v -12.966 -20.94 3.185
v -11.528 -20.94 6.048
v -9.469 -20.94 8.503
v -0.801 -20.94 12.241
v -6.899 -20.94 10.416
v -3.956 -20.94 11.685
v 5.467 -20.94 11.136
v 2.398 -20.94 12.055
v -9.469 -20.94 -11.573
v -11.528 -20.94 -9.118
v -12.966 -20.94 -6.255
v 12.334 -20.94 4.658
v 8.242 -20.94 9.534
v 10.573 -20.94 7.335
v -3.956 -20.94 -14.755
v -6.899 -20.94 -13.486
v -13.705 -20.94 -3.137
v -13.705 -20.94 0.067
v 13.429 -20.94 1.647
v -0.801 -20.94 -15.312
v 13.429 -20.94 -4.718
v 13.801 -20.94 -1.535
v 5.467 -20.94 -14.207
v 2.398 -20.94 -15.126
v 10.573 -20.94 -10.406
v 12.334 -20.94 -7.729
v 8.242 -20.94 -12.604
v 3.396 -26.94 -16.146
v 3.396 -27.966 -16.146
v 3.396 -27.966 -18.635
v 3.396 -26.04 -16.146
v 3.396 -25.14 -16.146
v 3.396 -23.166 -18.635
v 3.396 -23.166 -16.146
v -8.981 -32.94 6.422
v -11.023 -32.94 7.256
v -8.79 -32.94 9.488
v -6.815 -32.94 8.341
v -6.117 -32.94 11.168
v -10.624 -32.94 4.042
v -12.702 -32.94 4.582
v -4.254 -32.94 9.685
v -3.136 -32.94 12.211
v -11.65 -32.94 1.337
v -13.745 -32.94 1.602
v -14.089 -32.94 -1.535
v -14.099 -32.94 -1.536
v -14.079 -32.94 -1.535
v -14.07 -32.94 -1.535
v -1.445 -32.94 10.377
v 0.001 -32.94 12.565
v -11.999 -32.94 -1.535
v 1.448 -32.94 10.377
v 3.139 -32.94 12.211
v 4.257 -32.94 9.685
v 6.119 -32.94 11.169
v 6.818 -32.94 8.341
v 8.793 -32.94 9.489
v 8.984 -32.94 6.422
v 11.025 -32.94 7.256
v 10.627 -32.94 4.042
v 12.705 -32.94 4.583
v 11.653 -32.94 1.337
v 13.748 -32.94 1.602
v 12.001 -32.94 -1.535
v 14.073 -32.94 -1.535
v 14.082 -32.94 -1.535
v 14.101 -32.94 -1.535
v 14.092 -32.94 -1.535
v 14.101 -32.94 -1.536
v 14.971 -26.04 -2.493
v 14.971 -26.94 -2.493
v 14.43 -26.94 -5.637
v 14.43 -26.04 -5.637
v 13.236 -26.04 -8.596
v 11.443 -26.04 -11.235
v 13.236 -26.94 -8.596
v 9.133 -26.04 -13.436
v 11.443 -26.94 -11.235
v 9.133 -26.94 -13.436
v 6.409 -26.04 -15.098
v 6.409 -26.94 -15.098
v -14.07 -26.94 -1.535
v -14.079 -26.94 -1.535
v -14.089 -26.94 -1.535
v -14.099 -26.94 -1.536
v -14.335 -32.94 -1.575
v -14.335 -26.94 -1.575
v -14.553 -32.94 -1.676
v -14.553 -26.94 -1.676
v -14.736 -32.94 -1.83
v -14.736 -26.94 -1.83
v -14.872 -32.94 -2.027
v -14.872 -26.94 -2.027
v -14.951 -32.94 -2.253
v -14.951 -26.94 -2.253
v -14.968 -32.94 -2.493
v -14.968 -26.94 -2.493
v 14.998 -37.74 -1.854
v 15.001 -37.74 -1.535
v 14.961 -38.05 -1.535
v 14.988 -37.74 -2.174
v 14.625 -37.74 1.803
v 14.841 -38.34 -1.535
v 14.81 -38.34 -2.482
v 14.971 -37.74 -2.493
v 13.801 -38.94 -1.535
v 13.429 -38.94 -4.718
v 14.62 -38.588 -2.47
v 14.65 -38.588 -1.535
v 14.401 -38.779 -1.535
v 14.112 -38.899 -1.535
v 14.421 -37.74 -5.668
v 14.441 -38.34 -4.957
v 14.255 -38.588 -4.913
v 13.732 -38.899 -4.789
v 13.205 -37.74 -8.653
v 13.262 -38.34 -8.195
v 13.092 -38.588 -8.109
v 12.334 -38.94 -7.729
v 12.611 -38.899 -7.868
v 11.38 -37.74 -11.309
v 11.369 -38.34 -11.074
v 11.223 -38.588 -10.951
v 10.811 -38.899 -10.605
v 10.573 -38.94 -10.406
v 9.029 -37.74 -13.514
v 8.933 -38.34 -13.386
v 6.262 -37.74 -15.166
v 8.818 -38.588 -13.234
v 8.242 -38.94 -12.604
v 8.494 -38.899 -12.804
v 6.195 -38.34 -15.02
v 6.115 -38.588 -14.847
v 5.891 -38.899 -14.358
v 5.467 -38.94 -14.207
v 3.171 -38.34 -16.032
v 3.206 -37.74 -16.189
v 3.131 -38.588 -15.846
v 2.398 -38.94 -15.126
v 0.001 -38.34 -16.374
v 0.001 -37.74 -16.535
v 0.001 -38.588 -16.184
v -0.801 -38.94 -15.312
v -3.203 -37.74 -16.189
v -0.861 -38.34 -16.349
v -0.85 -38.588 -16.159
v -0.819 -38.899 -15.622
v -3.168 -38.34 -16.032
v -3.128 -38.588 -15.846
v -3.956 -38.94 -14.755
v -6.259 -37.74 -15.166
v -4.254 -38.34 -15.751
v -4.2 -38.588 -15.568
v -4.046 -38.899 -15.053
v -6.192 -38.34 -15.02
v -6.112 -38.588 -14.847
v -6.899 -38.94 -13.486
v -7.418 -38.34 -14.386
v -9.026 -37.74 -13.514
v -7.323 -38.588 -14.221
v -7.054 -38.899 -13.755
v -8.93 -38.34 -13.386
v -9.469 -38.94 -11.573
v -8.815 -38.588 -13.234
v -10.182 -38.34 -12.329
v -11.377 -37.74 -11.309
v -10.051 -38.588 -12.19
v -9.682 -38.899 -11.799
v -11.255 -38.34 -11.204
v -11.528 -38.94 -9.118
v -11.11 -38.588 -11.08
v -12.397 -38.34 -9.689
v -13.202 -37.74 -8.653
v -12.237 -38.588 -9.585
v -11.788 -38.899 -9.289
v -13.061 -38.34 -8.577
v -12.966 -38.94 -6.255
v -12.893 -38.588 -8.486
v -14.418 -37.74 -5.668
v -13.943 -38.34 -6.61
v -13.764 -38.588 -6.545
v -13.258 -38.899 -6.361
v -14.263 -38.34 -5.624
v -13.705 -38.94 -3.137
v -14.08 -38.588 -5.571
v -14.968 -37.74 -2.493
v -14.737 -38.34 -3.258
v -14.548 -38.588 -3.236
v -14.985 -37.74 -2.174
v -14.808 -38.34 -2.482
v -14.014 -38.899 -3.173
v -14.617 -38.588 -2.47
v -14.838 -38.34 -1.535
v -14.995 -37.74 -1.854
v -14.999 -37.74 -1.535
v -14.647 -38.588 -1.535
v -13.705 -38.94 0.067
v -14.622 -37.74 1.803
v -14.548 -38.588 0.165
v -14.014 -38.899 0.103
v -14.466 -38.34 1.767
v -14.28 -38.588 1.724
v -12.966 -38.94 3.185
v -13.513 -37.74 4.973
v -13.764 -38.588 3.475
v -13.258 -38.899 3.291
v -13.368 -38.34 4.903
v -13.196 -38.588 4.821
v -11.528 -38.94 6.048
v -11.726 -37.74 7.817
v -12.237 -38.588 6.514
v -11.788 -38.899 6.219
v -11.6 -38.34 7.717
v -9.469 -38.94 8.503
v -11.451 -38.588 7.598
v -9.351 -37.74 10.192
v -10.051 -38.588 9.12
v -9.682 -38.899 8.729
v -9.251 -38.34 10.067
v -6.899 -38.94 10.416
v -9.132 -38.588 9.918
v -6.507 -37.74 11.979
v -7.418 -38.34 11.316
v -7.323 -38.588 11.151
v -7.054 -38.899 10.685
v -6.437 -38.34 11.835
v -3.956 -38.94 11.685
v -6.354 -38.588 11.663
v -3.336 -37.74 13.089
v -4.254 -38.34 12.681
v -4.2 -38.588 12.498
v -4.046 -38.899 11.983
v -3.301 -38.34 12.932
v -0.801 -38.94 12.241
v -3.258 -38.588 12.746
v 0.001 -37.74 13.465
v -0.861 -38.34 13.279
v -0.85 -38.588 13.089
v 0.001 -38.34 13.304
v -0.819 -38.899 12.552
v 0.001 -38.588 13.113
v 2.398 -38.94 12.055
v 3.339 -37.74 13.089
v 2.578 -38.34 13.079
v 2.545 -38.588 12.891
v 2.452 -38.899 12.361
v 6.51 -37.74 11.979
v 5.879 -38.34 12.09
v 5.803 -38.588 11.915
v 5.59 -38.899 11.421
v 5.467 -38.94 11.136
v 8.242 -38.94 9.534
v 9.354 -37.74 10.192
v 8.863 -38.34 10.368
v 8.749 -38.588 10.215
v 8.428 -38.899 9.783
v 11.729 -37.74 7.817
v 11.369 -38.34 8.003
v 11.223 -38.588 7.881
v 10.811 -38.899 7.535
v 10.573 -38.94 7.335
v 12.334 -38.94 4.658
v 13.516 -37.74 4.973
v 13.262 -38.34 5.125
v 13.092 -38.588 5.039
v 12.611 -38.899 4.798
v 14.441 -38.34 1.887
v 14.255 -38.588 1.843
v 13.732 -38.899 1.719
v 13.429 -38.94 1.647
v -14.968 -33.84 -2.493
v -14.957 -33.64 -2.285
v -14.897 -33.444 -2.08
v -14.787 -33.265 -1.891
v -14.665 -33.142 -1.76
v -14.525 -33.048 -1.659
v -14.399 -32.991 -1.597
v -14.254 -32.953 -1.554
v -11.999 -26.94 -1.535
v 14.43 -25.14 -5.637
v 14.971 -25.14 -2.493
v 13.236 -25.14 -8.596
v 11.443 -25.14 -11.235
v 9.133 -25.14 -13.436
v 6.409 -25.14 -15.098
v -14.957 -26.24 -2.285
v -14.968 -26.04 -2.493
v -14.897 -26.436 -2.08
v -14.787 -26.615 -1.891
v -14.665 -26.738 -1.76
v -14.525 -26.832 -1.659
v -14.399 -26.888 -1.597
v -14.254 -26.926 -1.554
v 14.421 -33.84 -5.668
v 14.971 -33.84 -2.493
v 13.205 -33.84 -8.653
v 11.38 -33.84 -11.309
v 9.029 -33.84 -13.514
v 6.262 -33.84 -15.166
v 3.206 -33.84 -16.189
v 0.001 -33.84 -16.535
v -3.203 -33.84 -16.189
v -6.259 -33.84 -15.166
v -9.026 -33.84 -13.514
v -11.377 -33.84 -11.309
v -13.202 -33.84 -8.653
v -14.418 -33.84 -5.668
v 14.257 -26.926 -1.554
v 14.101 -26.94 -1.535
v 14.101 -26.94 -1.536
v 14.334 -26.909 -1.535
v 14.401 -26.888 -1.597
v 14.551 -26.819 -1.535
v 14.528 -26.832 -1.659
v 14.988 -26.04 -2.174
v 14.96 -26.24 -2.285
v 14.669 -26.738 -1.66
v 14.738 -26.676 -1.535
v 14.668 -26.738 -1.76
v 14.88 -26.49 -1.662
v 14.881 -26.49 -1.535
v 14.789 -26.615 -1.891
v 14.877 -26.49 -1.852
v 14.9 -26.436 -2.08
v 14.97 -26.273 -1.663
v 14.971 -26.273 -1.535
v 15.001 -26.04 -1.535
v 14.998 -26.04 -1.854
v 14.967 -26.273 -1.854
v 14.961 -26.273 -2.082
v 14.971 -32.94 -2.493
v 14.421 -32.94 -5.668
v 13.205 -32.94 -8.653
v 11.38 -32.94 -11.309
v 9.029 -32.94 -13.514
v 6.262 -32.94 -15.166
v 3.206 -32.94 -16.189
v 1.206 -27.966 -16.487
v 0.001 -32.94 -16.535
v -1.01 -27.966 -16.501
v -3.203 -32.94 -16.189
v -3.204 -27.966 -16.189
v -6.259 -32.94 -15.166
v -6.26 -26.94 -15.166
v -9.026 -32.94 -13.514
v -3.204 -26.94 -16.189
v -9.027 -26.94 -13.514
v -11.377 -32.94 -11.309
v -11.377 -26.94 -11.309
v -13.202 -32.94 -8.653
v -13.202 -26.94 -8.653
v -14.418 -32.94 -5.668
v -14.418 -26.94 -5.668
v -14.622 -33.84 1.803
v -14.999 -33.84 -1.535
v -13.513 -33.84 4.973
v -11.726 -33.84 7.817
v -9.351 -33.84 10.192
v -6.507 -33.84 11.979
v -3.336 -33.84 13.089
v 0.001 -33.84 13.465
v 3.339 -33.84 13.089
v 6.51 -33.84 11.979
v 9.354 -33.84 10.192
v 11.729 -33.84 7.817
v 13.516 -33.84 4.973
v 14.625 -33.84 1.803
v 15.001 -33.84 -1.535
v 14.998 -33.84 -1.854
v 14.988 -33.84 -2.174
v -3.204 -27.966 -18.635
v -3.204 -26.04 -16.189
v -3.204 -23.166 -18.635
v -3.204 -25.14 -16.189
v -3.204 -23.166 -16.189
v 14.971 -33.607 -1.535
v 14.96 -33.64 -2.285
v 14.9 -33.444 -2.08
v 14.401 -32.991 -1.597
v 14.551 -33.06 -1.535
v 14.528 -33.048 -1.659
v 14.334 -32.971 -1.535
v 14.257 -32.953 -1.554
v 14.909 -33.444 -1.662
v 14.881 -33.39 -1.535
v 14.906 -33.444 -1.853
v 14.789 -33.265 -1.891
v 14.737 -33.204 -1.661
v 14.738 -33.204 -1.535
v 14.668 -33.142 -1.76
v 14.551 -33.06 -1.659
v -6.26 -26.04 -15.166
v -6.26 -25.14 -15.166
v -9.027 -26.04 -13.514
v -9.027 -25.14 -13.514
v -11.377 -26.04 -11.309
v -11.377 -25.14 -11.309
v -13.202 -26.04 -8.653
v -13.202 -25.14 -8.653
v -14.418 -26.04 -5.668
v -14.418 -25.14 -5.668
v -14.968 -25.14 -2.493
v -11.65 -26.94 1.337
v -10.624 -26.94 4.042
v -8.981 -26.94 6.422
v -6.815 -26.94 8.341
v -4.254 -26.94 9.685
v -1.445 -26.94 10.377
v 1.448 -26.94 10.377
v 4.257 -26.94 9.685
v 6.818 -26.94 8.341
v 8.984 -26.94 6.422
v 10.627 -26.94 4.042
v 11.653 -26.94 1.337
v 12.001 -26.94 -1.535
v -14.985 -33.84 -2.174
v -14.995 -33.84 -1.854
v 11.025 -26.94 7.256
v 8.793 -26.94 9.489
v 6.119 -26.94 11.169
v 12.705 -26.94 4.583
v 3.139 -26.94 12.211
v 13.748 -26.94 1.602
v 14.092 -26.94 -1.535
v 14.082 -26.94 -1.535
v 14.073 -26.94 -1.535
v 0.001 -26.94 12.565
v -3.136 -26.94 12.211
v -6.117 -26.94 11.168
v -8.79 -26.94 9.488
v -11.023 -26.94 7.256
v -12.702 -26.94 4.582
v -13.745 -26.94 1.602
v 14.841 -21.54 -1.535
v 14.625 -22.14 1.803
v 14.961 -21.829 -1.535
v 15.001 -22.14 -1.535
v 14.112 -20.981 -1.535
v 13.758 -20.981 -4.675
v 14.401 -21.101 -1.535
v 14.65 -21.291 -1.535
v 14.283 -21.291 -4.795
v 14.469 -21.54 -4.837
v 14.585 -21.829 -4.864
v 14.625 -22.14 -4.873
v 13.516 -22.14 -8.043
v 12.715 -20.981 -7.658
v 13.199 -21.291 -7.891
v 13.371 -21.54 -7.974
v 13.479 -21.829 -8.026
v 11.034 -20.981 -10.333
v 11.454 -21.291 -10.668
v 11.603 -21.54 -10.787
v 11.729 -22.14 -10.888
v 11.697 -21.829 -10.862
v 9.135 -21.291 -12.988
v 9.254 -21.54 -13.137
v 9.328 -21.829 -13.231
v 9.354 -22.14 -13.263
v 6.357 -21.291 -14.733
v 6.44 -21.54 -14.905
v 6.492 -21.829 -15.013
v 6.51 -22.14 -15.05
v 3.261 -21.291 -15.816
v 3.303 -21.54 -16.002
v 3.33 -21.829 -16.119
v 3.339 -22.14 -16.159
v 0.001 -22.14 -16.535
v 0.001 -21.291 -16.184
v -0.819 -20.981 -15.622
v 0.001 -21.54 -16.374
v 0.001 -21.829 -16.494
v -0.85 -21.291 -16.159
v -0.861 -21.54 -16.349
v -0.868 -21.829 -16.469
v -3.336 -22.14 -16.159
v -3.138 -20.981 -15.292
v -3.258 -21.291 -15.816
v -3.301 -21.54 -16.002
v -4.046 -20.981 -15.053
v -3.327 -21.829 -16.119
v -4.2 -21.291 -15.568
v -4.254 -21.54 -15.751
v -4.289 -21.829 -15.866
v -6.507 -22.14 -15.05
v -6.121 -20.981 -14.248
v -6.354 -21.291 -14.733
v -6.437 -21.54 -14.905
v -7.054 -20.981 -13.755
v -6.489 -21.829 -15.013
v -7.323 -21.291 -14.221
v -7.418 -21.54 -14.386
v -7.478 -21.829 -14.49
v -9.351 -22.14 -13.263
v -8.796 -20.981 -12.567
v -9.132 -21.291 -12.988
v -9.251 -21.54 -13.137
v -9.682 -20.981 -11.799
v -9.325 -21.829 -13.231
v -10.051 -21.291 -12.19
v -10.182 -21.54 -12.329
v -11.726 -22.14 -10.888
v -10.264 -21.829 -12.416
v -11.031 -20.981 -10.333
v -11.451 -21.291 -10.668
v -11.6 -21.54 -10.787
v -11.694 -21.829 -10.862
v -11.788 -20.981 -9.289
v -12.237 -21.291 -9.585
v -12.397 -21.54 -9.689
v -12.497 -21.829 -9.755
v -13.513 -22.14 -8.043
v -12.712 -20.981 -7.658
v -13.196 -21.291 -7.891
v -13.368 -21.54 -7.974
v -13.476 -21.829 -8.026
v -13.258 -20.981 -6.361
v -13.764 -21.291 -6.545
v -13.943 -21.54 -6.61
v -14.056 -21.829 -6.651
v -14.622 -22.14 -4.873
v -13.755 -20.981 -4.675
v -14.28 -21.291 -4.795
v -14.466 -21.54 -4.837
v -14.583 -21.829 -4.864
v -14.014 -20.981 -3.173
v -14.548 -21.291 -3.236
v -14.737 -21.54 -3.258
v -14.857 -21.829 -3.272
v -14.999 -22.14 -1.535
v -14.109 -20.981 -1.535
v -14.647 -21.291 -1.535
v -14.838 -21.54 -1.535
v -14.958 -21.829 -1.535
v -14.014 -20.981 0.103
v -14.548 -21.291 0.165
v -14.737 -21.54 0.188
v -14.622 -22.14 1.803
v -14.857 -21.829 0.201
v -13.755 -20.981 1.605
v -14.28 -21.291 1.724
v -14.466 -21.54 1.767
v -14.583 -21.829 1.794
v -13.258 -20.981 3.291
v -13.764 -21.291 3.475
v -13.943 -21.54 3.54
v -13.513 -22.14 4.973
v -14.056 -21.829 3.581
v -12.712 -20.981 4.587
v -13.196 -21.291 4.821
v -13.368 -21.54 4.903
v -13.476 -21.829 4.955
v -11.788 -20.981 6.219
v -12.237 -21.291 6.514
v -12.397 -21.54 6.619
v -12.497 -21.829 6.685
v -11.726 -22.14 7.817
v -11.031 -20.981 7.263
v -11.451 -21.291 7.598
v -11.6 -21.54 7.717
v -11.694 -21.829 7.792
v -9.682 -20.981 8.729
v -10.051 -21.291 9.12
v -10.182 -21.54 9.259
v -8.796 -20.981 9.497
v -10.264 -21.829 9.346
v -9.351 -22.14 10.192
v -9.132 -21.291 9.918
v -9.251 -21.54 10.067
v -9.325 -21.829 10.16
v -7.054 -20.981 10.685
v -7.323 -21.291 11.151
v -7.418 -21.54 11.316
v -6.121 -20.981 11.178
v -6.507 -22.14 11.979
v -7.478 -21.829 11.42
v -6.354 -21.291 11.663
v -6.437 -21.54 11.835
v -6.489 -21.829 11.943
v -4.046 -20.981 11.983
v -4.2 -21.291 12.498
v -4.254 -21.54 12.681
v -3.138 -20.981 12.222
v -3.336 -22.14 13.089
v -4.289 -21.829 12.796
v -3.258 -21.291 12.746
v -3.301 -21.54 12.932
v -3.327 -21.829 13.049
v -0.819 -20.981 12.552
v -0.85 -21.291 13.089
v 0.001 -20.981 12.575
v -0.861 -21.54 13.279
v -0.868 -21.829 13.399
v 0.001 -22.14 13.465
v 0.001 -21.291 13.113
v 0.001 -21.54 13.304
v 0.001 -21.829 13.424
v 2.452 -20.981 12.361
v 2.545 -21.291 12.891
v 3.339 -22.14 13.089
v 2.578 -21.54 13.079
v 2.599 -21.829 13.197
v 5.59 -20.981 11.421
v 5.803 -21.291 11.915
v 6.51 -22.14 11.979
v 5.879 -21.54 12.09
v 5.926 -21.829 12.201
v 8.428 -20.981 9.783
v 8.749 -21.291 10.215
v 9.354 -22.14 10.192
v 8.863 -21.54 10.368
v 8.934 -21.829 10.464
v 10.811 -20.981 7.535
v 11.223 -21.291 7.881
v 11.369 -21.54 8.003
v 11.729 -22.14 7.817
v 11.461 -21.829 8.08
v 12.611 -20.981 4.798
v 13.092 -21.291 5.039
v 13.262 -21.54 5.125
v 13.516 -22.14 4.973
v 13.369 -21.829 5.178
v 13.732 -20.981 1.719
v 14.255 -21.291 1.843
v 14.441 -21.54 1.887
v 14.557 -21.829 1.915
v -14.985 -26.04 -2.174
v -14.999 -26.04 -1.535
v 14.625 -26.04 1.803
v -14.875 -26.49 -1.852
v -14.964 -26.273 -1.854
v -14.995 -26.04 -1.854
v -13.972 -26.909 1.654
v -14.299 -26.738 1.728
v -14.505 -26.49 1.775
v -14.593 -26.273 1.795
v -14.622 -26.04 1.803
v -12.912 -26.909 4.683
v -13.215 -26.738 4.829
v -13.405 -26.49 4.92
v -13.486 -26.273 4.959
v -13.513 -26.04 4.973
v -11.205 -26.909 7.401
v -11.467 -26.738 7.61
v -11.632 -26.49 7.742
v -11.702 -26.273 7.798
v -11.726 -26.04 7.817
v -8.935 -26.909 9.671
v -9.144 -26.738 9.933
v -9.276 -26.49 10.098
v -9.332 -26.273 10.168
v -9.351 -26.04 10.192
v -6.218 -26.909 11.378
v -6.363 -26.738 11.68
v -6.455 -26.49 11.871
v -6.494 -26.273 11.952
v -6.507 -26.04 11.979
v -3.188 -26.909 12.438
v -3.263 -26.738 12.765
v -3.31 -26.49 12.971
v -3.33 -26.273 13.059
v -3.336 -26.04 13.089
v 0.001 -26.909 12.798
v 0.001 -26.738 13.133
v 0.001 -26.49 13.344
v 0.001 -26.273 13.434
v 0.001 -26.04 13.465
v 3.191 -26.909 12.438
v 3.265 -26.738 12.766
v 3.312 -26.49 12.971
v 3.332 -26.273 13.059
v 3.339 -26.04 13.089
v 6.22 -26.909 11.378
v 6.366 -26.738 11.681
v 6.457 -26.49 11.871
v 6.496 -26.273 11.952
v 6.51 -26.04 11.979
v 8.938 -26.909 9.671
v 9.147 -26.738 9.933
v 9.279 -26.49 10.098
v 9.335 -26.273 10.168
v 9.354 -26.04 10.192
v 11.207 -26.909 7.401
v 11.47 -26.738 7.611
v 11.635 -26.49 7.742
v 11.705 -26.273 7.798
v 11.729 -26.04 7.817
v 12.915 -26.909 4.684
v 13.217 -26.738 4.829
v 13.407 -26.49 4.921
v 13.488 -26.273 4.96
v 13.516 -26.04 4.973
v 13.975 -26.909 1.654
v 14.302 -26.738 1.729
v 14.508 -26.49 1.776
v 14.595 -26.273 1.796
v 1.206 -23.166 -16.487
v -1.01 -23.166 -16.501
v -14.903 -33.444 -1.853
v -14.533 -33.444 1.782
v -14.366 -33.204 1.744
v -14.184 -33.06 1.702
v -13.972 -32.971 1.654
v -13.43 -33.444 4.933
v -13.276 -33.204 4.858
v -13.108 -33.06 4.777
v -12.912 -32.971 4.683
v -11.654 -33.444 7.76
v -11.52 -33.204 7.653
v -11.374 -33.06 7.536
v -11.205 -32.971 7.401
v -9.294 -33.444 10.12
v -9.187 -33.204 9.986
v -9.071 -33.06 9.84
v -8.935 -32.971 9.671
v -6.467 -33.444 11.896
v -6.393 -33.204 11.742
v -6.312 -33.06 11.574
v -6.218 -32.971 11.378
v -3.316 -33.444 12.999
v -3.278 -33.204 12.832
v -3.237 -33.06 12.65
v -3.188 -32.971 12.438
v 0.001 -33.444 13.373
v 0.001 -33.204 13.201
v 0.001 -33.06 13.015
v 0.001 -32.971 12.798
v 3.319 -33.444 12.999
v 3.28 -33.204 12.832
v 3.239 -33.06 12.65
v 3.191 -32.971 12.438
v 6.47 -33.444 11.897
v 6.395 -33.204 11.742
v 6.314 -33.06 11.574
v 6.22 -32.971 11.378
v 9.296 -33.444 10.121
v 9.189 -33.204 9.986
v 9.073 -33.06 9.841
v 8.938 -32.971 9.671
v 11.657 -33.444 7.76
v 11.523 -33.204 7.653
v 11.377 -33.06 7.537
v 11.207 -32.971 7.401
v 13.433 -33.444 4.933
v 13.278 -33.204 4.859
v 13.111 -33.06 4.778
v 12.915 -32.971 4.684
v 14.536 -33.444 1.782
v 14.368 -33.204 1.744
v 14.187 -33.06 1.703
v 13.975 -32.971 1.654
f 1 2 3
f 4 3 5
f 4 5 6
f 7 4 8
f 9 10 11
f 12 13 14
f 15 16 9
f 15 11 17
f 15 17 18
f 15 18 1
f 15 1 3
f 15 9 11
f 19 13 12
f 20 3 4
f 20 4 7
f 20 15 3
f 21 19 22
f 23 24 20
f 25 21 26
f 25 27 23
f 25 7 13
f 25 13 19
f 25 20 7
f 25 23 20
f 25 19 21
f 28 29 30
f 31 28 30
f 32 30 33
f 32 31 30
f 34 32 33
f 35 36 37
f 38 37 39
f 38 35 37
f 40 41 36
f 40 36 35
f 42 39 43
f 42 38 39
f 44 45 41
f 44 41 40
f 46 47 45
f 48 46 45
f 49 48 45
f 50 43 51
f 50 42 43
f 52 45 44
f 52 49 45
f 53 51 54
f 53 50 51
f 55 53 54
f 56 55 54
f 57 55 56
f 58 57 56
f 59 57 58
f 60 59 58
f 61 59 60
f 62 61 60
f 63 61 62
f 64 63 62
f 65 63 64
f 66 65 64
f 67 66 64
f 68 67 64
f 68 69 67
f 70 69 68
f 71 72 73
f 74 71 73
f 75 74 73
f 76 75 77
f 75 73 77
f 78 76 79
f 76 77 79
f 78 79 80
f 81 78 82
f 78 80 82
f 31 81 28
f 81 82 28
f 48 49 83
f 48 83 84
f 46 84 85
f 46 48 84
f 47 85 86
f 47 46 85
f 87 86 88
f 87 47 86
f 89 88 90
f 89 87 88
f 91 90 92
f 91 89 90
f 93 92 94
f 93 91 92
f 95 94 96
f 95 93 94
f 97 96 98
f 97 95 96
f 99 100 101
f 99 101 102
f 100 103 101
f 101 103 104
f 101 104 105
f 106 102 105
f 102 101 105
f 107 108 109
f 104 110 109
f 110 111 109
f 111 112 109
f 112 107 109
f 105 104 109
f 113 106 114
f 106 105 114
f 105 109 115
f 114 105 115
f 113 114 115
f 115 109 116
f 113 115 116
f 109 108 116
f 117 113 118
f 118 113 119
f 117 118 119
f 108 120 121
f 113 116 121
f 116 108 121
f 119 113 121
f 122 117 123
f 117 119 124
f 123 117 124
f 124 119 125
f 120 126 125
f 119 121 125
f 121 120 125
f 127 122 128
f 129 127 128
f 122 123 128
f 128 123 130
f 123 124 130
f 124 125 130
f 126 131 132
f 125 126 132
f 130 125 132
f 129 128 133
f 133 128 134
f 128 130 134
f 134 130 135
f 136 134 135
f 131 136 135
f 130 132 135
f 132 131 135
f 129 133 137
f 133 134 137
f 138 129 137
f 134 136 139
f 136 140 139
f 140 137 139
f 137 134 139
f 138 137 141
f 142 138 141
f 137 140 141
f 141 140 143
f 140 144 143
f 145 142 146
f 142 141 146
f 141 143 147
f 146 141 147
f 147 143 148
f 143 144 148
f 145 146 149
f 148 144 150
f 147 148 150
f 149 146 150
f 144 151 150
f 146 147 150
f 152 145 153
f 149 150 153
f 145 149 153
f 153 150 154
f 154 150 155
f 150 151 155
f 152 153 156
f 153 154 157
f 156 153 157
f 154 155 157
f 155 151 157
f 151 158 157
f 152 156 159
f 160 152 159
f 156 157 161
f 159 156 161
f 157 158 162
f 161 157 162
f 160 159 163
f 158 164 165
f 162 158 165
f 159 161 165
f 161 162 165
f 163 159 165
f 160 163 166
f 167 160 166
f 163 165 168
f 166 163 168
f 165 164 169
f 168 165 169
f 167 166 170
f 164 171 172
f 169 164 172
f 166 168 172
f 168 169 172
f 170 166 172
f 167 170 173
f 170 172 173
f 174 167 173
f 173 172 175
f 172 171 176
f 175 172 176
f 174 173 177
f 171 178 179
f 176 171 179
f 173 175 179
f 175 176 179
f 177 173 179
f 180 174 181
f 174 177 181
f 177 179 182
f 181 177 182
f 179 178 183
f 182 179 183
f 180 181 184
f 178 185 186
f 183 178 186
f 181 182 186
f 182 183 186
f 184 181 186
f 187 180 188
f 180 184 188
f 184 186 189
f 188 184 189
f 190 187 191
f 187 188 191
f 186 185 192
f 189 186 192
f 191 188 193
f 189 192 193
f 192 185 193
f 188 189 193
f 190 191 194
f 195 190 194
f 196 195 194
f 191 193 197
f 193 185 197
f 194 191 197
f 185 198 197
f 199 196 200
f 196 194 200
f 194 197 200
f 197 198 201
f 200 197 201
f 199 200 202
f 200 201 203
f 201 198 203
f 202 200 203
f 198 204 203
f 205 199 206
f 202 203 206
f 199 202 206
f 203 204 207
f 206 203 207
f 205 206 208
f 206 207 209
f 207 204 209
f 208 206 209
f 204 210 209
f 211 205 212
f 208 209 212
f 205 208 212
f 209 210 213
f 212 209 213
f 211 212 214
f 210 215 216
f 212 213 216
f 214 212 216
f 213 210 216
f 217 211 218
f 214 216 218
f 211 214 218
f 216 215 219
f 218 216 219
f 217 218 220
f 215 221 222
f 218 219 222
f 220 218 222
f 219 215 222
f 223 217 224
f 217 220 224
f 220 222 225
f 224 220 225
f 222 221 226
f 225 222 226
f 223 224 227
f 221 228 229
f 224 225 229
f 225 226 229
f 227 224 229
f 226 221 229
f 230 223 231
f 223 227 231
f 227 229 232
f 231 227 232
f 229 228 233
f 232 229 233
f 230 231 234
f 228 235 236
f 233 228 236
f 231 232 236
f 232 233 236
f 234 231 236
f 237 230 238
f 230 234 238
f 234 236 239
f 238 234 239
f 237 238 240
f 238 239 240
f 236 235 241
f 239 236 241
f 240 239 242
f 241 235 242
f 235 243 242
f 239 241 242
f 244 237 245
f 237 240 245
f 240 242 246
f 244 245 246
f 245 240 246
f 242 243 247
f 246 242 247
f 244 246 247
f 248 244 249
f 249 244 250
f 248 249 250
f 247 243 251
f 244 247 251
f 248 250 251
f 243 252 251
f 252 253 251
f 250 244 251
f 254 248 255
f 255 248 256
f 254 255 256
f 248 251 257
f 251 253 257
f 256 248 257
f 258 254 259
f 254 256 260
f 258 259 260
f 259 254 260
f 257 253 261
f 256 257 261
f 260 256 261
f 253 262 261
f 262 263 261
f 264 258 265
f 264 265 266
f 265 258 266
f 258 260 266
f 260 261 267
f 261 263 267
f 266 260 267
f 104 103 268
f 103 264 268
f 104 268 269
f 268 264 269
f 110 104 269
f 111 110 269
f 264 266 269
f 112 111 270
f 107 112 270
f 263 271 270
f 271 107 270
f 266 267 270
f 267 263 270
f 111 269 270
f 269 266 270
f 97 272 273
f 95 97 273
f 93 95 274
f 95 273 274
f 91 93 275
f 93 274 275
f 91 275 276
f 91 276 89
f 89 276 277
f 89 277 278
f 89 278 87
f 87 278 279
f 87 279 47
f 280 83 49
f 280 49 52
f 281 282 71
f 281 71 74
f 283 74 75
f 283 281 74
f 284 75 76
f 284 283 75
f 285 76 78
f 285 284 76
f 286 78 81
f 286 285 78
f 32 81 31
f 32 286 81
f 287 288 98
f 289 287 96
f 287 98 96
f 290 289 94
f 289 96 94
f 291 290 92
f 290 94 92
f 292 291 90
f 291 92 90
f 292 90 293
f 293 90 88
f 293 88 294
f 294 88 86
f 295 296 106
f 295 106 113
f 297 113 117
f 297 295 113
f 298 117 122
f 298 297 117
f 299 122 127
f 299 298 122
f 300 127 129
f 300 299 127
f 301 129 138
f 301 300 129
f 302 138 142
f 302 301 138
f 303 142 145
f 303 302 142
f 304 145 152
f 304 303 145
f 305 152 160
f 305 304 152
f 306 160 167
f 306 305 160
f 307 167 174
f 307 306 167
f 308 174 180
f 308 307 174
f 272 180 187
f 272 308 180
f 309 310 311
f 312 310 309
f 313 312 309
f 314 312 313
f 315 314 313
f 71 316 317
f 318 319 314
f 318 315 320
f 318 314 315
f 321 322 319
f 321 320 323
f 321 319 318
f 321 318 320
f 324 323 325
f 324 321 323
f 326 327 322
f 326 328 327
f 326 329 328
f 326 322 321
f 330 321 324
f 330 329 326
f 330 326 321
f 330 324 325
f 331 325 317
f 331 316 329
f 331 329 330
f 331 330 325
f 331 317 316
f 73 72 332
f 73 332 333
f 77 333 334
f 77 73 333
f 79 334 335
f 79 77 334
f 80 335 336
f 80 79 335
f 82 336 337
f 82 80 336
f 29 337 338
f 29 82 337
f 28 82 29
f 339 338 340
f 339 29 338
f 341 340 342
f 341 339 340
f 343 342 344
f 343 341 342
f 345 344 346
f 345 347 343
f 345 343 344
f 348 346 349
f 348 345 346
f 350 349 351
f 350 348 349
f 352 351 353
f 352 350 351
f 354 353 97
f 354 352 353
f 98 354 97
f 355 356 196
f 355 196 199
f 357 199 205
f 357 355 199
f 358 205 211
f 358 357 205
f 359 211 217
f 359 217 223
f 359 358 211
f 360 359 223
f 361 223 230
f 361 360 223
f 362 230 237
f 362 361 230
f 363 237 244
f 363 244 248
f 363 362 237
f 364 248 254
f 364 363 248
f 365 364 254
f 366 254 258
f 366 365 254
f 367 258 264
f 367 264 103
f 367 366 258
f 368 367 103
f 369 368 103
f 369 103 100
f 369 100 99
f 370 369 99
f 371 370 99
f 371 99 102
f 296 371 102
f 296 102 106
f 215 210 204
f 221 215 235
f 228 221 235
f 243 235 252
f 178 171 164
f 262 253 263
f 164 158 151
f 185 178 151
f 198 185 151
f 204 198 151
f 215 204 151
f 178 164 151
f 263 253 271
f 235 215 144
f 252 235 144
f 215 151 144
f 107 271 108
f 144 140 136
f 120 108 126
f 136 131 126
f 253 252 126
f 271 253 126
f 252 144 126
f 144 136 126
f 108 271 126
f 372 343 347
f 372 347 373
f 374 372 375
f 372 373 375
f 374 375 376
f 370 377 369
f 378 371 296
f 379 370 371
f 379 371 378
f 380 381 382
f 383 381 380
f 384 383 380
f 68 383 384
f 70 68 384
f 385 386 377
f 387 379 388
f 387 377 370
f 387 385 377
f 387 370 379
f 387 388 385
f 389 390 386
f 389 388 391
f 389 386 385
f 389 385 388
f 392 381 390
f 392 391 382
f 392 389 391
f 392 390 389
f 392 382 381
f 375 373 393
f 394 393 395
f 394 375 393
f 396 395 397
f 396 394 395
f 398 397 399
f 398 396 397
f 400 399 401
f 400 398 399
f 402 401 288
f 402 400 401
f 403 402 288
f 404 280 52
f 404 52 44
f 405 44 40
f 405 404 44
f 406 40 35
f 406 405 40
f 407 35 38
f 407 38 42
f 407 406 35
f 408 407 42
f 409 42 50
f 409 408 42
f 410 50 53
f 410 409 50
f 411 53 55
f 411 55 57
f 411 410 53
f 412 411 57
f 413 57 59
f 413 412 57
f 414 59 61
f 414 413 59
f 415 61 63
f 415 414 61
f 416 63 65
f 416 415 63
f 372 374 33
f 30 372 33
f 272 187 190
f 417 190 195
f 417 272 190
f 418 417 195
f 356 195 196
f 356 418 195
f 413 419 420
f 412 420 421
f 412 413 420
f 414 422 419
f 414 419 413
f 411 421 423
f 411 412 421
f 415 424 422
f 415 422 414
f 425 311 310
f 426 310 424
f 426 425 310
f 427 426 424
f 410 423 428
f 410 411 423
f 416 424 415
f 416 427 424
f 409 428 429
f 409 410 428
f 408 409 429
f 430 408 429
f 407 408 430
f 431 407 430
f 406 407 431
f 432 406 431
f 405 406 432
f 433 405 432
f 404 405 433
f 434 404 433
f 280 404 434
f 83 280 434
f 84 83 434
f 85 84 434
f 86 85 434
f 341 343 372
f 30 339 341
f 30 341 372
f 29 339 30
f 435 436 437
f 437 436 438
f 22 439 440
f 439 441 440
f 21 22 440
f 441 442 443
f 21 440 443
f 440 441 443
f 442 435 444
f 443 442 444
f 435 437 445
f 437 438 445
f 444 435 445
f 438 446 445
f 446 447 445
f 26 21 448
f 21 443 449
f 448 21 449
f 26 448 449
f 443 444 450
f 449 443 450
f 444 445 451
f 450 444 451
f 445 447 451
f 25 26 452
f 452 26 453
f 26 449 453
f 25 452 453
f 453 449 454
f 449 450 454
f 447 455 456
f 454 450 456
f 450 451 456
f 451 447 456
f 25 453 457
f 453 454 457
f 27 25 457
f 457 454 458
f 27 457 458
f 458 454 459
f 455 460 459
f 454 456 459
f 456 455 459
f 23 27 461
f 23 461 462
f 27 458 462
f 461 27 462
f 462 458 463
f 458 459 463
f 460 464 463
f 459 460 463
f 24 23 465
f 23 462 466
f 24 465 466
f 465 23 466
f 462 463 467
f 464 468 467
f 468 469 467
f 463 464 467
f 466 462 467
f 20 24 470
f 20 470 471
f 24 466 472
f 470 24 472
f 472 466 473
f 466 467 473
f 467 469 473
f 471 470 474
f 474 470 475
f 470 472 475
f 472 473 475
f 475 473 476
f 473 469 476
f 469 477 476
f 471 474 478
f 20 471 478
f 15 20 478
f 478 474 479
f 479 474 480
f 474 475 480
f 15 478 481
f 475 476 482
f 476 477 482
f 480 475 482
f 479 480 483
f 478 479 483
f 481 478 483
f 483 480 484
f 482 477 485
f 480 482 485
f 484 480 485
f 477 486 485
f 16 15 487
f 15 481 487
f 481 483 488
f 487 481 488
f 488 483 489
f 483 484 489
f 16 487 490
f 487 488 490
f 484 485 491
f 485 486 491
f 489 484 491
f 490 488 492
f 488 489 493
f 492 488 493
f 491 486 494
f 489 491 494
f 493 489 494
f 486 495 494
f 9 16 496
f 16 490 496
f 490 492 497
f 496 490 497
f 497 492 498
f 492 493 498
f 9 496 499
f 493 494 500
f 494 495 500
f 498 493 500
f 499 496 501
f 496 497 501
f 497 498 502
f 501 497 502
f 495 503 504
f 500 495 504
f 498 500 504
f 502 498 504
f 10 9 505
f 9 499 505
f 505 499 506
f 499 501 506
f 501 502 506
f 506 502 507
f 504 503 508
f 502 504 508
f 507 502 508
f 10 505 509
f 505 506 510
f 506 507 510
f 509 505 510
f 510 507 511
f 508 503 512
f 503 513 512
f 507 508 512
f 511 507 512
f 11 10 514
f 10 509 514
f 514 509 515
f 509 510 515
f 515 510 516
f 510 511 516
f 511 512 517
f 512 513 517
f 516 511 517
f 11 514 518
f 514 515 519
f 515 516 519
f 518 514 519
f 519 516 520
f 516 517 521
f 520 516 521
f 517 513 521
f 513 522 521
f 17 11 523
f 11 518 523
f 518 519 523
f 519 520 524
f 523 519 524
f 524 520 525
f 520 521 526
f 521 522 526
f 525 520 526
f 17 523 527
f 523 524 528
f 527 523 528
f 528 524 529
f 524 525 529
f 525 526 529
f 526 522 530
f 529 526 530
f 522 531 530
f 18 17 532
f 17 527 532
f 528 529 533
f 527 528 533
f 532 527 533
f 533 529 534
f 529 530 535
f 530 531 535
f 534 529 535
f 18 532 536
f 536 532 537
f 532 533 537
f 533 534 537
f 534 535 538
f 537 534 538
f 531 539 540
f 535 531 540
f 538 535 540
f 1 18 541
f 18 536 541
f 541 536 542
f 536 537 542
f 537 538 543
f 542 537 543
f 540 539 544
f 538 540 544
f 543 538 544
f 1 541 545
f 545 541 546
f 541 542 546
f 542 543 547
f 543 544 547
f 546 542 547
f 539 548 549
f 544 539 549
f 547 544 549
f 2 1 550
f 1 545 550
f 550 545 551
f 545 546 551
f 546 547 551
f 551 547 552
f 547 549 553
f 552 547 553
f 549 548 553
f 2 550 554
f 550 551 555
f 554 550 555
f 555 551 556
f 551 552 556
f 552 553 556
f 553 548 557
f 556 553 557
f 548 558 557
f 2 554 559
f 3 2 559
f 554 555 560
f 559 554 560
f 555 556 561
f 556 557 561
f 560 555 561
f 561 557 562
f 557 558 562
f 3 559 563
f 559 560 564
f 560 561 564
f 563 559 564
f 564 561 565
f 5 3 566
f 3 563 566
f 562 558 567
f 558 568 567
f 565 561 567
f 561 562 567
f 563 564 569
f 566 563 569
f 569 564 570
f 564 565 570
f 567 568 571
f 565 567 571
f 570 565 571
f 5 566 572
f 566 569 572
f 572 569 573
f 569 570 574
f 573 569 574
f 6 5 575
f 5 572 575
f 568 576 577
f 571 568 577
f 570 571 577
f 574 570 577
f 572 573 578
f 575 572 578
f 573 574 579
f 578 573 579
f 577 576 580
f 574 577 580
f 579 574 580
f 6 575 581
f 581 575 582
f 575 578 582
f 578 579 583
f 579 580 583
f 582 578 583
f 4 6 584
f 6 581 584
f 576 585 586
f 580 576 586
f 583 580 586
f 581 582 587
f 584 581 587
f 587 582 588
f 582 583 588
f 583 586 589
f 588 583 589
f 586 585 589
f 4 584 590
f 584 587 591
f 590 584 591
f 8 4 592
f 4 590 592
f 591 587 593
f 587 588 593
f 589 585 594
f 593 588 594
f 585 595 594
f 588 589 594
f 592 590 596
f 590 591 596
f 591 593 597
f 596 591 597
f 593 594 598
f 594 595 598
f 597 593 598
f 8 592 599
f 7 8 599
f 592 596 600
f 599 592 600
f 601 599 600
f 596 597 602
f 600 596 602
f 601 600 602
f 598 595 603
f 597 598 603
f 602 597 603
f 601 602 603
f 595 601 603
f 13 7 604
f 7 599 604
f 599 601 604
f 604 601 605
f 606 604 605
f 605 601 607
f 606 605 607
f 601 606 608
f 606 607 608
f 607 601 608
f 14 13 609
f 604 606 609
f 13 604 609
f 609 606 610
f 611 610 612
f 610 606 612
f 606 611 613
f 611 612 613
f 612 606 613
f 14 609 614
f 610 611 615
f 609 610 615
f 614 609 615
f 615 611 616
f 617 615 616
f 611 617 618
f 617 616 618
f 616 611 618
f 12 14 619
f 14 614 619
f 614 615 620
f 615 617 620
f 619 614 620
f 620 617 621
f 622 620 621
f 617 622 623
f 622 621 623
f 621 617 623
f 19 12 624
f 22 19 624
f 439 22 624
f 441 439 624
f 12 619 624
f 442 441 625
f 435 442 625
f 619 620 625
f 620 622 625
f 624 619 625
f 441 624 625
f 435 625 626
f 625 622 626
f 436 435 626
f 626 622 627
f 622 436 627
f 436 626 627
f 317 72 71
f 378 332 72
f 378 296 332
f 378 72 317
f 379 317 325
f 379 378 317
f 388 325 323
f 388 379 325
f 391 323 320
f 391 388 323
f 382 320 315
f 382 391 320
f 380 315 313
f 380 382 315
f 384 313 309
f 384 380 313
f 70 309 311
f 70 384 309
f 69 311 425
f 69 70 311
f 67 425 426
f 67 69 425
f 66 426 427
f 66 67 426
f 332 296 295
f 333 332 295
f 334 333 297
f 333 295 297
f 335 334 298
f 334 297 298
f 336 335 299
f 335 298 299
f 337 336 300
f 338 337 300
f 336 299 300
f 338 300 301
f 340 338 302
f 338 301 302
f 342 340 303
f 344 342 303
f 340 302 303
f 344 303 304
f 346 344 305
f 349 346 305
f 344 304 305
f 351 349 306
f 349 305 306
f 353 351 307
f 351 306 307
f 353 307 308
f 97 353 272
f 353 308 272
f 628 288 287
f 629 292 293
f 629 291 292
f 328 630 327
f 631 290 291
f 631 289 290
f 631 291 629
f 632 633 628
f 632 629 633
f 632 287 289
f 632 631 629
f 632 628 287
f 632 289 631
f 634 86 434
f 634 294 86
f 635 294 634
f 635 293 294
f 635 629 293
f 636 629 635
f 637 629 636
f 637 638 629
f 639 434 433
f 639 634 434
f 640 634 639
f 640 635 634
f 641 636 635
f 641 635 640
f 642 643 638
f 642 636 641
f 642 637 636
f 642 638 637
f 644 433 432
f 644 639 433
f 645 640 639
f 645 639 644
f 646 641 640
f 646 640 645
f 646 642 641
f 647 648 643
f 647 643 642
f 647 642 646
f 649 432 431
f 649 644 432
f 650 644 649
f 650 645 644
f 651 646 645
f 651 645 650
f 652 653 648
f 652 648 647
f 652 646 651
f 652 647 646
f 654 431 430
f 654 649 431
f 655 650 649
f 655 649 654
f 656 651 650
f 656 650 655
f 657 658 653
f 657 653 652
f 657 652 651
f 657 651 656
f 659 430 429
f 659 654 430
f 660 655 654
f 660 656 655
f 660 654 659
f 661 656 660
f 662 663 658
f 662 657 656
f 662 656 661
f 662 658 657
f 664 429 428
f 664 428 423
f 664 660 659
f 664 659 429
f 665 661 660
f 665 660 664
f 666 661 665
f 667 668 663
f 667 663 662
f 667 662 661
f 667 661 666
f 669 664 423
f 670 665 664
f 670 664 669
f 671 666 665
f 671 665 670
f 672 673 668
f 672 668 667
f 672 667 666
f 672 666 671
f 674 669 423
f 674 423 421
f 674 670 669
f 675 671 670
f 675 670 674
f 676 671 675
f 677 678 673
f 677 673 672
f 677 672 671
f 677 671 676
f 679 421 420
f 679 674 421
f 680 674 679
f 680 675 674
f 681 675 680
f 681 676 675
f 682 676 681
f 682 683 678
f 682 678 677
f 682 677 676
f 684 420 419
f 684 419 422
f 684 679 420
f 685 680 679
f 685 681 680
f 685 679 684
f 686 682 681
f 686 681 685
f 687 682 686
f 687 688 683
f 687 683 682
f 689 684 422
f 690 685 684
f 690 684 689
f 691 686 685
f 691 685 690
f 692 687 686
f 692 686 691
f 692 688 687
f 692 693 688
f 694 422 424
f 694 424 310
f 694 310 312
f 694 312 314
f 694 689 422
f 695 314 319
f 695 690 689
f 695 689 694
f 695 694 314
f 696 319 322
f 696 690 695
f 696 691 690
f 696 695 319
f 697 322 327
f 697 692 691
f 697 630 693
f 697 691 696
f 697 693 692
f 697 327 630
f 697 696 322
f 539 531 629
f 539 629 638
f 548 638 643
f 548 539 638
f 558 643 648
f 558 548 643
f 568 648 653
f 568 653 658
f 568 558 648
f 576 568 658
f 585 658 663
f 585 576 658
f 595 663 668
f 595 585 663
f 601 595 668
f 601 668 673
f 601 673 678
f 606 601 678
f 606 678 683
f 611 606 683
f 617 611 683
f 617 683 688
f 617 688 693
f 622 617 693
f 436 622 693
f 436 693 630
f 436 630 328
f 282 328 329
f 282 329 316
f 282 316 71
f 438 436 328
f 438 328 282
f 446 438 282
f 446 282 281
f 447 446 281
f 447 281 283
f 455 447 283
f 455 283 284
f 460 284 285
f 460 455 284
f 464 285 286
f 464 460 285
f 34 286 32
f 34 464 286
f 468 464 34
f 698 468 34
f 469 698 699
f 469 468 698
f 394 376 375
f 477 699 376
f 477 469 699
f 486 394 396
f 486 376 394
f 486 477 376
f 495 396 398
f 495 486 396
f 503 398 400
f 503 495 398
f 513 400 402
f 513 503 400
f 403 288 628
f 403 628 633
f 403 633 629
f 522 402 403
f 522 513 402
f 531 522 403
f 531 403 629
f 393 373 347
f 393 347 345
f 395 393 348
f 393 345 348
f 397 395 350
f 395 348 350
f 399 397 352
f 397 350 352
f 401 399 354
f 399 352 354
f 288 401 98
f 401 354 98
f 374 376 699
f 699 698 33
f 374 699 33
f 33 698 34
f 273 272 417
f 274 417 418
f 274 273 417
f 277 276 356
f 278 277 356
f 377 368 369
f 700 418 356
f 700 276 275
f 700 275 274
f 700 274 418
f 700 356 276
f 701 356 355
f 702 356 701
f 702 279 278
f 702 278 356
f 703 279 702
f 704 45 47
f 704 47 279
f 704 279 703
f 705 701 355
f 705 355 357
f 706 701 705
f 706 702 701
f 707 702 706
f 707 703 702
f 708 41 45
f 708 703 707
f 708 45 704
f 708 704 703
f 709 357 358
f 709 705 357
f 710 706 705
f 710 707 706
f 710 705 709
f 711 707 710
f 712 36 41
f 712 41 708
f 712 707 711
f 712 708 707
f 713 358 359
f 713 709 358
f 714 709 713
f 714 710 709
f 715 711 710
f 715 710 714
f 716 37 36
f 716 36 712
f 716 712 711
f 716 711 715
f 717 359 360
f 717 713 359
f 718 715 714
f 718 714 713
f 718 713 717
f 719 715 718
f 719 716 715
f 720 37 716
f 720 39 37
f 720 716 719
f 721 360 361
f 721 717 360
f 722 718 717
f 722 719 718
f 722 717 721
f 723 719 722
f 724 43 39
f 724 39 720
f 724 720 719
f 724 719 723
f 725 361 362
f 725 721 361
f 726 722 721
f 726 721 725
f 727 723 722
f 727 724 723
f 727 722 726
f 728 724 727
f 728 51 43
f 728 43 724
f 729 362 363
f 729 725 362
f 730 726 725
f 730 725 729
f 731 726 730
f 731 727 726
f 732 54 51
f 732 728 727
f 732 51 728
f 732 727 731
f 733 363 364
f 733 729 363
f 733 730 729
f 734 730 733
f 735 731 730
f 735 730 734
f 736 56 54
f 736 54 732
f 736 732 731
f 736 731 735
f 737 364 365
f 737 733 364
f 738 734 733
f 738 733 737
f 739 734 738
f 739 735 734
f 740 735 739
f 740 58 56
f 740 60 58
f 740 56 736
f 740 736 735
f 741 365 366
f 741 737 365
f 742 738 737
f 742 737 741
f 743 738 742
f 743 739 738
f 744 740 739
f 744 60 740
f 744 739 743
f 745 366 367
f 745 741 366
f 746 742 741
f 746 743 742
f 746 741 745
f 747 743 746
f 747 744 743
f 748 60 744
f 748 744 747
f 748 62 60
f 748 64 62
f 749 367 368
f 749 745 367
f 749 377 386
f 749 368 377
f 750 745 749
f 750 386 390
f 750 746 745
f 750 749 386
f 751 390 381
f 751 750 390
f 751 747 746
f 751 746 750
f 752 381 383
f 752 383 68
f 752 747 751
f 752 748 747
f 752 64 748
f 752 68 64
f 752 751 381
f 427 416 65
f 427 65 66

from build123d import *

# Parameters (mm, degrees)
BOSS_EXTRUDE2_DEPTH = 60
BOSS_EXTRUDE3_DEPTH = 20
BOSS_EXTRUDE5_START = -40
BOSS_EXTRUDE5_DEPTH = 20
FILLET2_START       = -43.0000001
FILLET2_OUTLINE_R   = 50
FILLET2_DEPTH       = 3.0000001
FILLET2_START_2     = -20
FILLET2_2_OUTLINE_R = 50
FILLET2_2_DEPTH     = 3.0000001
FILLET2_START_3     = -40
FILLET2_3_DEPTH     = 20
FILLET2_START_4     = -56.0000001
FILLET2_5_DEPTH     = 42.000000197
SKETCH2_W           = 22
SKETCH2_H           = 16
BOSS_EXTRUDE6_DEPTH = 5
SKETCH2_2_W         = 22
SKETCH2_2_H         = 16
BOSS_EXTRUDE7_DEPTH = 7
SCALE6_SCALE        = 0.3


with BuildPart() as part:
    # Sketch1 → Boss-Extrude2 (new body)
    with BuildSketch(Plane(origin=(0, 0, 0), x_dir=(1, 0, 0), z_dir=(0, 1, 0))):
        with BuildLine():
            ThreePointArc((-40, 0), (0, -40), (40, 0))
            Line((40, 0), (50, 0))
            ThreePointArc((50, 0), (0, 50), (-50, 0))
            Line((-50, 0), (-40, 0))
        make_face()
    extrude(amount=-BOSS_EXTRUDE2_DEPTH)

    # Sketch1<4> → Boss-Extrude3 (add)
    with BuildSketch(Plane(origin=(0, 0, 0), x_dir=(1, 0, 0), z_dir=(0, 1, 0))):
        with BuildLine():
            ThreePointArc((-40, 0), (0, -40), (40, 0))
            Line((40, 0), (50, 0))
            ThreePointArc((50, 0), (0, 50), (-50, 0))
            Line((-50, 0), (-40, 0))
        make_face()
        with BuildLine():
            Line((50, 0), (40, 0))
            ThreePointArc((40, 0), (0, -40), (-40, 0))
            Line((-40, 0), (-50, 0))
            ThreePointArc((-50, 0), (0, -50), (50, 0))
        make_face()
    extrude(amount=-BOSS_EXTRUDE3_DEPTH)

    # Sketch1<6> → Boss-Extrude5 (add)
    with BuildSketch(Plane(origin=(0, 0, 0), x_dir=(1, 0, 0), z_dir=(0, 1, 0)).offset(BOSS_EXTRUDE5_START)):
        with BuildLine():
            ThreePointArc((-40, 0), (0, -40), (40, 0))
            Line((40, 0), (50, 0))
            ThreePointArc((50, 0), (0, 50), (-50, 0))
            Line((-50, 0), (-40, 0))
        make_face()
        with BuildLine():
            Line((50, 0), (40, 0))
            ThreePointArc((40, 0), (0, -40), (-40, 0))
            Line((-40, 0), (-50, 0))
            ThreePointArc((-50, 0), (0, -50), (50, 0))
        make_face()
    extrude(amount=-BOSS_EXTRUDE5_DEPTH)

    # Fillet1: read off the stored shape, not the designer's step
    # Fillet1 outline → Fillet1 (revolve, cut)
    with BuildSketch(Plane.XY):
        with BuildLine():
            ThreePointArc((46, 0), (48.828427125, -1.171572875), (50, -4))
            Line((50, -4), (50, 0))
            Line((50, 0), (46, 0))
        make_face()
        with BuildLine():
            Line((50, -60), (50, -56))
            ThreePointArc((50, -56), (48.828427125, -58.828427125), (46, -60))
            Line((46, -60), (50, -60))
        make_face()
    revolve(axis=Axis((0, 0, 0), (0, 1, 0)), mode=Mode.SUBTRACT)

    # Fillet2: read off the stored shape, not the designer's step
    # Fillet2 outline → Fillet2 (cut)
    with BuildSketch(Plane(origin=(0, 0, 0), x_dir=(1, 0, 0), z_dir=(0, 1, 0)).offset(FILLET2_START)):
        Circle(FILLET2_OUTLINE_R)
    extrude(amount=FILLET2_DEPTH, mode=Mode.SUBTRACT)

    # Fillet2 2 outline → Fillet2 2 (cut)
    with BuildSketch(Plane(origin=(0, 0, 0), x_dir=(1, 0, 0), z_dir=(0, 1, 0)).offset(FILLET2_START_2)):
        Circle(FILLET2_2_OUTLINE_R)
    extrude(amount=FILLET2_2_DEPTH, mode=Mode.SUBTRACT)

    # Fillet2 3 outline → Fillet2 3 (cut)
    with BuildSketch(Plane(origin=(0, 0, 0), x_dir=(1, 0, 0), z_dir=(0, 1, 0)).offset(FILLET2_START_3)):
        with BuildLine():
            ThreePointArc((49.898039998, 3.191489362), (49.092132471, 0.947497635), (46.904157598, 0))
            Line((46.904157598, 0), (50, 0))
            ThreePointArc((50, 0), (49.974503499, 1.596558814), (49.898039998, 3.191489362))
        make_face()
        with BuildLine():
            ThreePointArc((-46.904157598, 0), (-49.092132471, 0.947497635), (-49.898039998, 3.191489362))
            ThreePointArc((-49.898039998, 3.191489362), (-49.974503499, 1.596558814), (-50, 0))
            Line((-50, 0), (-46.904157598, 0))
        make_face()
    extrude(amount=FILLET2_3_DEPTH, mode=Mode.SUBTRACT)

    # Fillet2 4 outline → Fillet2 4 (revolve)
    with BuildSketch(Plane.XY):
        with BuildLine():
            Line((0, -17), (0, -20))
            Line((0, -20), (47, -20))
            ThreePointArc((47, -20), (49.121320344, -19.121320344), (50, -17))
            Line((50, -17), (0, -17))
        make_face()
        with BuildLine():
            Line((47, -40), (0, -40))
            Line((0, -40), (0, -43))
            Line((0, -43), (50, -43))
            ThreePointArc((50, -43), (49.121320344, -40.878679656), (47, -40))
        make_face()
    revolve(axis=Axis((0, 0, 0), (0, 1, 0)))

    # Fillet2 5 outline → Fillet2 5 (add)
    with BuildSketch(Plane(origin=(0, 0, 0), x_dir=(1, 0, 0), z_dir=(0, 1, 0)).offset(FILLET2_START_4)):
        with BuildLine():
            ThreePointArc((46.904157598, 0), (49.092132471, 0.947497635), (49.898039998, 3.191489362))
            ThreePointArc((49.898039998, 3.191489362), (0, 50), (-49.898039998, 3.191489362))
            ThreePointArc((-49.898039998, 3.191489362), (-49.092132471, 0.947497635), (-46.904157598, 0))
            Line((-46.904157598, 0), (46.904157598, 0))
        make_face()
    extrude(amount=FILLET2_5_DEPTH)

    # Sketch2 → Boss-Extrude6 (add)
    with BuildSketch(Plane.XY.offset(-50)):
        with Locations((0.314864649, -15.421130919)):
            Rectangle(SKETCH2_W, SKETCH2_H)
    extrude(amount=BOSS_EXTRUDE6_DEPTH)

    # Sketch2<2> → Boss-Extrude7 (add)
    with BuildSketch(Plane.XY.offset(-50)):
        with Locations((0.314864649, -15.421130919)):
            Rectangle(SKETCH2_2_W, SKETCH2_2_H)
    extrude(amount=-BOSS_EXTRUDE7_DEPTH)


with BuildPart() as part_1:
    # Scale6: scaled about (0.002059133, -29.914145752, -2.193081509)
    add(part.part.scale(SCALE6_SCALE).moved(Location((0.001441393, -20.939902026, -1.535157056))))


solid = part_1.part
